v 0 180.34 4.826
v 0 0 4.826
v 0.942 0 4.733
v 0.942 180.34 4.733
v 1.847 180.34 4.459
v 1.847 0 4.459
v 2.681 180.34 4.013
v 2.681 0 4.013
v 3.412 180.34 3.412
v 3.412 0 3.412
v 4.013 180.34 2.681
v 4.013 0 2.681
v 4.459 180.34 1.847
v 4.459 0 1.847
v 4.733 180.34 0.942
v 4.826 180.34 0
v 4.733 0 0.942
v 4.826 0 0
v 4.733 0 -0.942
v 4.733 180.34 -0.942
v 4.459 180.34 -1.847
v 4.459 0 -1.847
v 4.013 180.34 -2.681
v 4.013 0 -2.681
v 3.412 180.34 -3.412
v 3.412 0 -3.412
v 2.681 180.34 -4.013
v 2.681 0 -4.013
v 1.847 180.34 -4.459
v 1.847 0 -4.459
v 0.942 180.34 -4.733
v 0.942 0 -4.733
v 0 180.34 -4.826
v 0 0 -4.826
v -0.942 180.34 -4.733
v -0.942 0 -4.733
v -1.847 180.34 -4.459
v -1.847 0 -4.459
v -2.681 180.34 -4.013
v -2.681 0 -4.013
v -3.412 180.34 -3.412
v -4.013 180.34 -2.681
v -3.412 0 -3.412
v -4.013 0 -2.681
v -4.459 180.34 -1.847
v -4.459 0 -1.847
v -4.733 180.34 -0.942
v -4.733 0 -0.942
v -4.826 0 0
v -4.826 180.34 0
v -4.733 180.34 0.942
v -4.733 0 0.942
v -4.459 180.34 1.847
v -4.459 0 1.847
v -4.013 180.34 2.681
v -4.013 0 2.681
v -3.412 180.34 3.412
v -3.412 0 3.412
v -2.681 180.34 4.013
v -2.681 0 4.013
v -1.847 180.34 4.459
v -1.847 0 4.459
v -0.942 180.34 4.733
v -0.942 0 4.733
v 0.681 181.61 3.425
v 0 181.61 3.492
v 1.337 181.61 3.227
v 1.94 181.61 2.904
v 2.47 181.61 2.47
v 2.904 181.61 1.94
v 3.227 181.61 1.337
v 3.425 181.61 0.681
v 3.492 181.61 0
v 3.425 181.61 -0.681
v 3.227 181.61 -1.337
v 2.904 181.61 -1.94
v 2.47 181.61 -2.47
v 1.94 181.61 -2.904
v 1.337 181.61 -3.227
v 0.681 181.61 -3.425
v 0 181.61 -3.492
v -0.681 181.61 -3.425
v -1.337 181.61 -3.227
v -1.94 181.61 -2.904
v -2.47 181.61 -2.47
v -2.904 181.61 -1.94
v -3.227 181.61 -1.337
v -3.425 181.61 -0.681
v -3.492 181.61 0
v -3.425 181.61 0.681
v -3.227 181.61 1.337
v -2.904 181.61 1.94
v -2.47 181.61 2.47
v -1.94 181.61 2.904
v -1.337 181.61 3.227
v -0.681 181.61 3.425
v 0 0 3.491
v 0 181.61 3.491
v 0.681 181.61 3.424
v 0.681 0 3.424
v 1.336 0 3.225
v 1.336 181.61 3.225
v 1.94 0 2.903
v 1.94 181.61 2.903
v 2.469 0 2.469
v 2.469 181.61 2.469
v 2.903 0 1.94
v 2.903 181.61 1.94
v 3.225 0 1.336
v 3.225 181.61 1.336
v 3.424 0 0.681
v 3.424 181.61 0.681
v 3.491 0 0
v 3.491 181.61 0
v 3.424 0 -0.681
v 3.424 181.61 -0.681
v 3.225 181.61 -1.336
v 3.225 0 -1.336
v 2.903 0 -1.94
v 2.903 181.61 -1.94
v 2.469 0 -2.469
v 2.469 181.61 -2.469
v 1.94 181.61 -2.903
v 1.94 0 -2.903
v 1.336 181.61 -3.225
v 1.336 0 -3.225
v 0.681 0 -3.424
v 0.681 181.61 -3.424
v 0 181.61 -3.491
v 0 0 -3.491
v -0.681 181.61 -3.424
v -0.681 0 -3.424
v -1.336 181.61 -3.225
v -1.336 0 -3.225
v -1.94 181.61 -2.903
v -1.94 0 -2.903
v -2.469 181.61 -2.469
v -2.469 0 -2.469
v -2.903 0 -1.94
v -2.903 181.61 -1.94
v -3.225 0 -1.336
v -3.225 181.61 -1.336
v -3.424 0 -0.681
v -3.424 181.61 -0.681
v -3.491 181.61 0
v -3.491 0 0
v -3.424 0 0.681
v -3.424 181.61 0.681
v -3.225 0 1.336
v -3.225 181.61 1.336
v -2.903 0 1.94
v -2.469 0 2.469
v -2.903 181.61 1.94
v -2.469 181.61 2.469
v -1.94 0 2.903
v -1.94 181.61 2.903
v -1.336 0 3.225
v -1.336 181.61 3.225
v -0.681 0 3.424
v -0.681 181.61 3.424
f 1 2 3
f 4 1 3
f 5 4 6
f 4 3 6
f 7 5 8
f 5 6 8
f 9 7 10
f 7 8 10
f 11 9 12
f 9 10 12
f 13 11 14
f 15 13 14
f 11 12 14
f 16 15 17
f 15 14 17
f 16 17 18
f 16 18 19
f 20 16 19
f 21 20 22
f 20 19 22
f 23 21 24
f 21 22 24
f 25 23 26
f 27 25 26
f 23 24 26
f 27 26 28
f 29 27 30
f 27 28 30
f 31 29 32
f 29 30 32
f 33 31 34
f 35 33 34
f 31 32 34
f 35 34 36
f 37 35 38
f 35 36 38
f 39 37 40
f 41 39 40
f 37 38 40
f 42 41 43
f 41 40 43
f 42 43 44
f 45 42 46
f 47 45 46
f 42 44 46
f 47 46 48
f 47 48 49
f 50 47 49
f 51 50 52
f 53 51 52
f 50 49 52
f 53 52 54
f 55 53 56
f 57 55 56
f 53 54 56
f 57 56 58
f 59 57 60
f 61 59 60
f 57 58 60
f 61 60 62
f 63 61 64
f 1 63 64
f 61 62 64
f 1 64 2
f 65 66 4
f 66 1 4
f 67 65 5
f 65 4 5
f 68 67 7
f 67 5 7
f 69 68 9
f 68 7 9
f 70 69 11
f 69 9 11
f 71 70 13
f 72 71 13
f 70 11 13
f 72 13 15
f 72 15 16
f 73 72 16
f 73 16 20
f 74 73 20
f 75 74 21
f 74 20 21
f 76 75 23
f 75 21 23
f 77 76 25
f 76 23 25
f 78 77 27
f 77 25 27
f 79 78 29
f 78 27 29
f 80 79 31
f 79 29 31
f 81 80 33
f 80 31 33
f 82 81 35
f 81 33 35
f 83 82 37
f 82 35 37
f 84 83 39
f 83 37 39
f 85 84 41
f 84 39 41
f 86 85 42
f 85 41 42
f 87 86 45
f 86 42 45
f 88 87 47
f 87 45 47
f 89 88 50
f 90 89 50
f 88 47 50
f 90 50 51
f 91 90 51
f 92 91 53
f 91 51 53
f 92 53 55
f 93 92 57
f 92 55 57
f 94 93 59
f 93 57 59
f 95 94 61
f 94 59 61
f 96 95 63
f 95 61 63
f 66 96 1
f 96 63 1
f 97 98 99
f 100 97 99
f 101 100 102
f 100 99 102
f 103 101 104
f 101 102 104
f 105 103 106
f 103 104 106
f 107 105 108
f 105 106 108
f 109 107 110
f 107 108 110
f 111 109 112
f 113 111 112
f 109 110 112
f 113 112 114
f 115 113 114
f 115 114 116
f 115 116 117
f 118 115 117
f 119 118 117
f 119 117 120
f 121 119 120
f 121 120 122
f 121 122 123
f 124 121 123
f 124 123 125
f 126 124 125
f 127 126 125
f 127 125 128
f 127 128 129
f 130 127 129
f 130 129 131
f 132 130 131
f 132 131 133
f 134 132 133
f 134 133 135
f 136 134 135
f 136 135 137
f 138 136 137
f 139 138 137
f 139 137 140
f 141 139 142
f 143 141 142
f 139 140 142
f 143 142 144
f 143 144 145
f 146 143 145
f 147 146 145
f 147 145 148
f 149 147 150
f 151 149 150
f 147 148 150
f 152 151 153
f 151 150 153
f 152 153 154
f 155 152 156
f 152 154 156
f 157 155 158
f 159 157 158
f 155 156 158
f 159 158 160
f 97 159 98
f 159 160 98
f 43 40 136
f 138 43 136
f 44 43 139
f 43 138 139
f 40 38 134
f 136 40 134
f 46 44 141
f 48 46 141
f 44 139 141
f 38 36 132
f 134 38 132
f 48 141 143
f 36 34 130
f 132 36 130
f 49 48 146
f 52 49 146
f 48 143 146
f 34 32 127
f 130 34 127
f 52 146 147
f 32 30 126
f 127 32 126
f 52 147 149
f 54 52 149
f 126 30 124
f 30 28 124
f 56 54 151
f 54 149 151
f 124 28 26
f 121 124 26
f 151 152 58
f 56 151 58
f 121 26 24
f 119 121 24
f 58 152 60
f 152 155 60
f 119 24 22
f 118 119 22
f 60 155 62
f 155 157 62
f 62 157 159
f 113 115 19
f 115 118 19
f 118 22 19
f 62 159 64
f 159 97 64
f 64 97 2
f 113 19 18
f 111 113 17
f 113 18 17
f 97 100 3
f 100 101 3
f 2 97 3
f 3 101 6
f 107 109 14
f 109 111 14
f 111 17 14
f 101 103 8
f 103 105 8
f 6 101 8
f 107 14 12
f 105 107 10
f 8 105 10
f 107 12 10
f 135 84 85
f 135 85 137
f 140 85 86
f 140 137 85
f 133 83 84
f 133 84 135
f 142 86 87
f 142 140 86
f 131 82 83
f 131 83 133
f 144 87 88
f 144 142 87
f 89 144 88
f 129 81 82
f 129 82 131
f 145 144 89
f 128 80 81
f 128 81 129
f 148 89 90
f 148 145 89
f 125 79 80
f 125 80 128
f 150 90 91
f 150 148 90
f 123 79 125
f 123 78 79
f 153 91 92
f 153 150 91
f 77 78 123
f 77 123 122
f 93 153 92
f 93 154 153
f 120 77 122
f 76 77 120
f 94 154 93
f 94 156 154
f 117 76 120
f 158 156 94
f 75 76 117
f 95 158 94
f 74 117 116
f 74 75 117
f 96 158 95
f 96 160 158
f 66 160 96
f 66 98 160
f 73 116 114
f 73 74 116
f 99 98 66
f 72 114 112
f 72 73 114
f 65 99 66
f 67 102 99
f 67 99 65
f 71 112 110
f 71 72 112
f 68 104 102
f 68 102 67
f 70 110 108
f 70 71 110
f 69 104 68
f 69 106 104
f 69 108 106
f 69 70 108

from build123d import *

# Parameters (mm, degrees)
SKETCH1_R           = 4.826
BOSS_EXTRUDE1_DEPTH = 180.34
SKETCH2_R           = 3.4925
BOSS_EXTRUDE2_DEPTH = 1.27
SKETCH3_R           = 3.49123
CUT_EXTRUDE2_DEPTH  = 203.2


with BuildPart() as part:
    # Sketch1 → Boss-Extrude1 (new body)
    with BuildSketch(Plane(origin=(0, 0, 0), x_dir=(1, 0, 0), z_dir=(0, 1, 0))):
        with Locations(Location((0, 0, 0), (0, 0, 270))):
            Circle(SKETCH1_R)
    extrude(amount=BOSS_EXTRUDE1_DEPTH)

    # Sketch2 → Boss-Extrude2 (add)
    with BuildSketch(Plane(origin=(0, 180.34, 0), x_dir=(1, 0, 0), z_dir=(0, 1, 0))):
        with Locations(Location((0, 0, 0), (0, 0, 270))):
            Circle(SKETCH2_R)
    extrude(amount=BOSS_EXTRUDE2_DEPTH)

    # loft from a face of the part (loft3)
    loft([part.faces().sort_by_distance((0, 181.61, 0))[0], Face(Wire([part.edges().sort_by_distance((3.518002596, 180.34, -3.303624333))[0]]))])

    # Sketch3 → Cut-Extrude2 (cut)
    with BuildSketch(Plane(origin=(0, 181.61, 0), x_dir=(1, 0, 0), z_dir=(0, 1, 0))):
        with Locations(Location((0, 0, 0), (0, 0, 270))):
            Circle(SKETCH3_R)
    extrude(amount=-CUT_EXTRUDE2_DEPTH, mode=Mode.SUBTRACT)


solid = part.part
